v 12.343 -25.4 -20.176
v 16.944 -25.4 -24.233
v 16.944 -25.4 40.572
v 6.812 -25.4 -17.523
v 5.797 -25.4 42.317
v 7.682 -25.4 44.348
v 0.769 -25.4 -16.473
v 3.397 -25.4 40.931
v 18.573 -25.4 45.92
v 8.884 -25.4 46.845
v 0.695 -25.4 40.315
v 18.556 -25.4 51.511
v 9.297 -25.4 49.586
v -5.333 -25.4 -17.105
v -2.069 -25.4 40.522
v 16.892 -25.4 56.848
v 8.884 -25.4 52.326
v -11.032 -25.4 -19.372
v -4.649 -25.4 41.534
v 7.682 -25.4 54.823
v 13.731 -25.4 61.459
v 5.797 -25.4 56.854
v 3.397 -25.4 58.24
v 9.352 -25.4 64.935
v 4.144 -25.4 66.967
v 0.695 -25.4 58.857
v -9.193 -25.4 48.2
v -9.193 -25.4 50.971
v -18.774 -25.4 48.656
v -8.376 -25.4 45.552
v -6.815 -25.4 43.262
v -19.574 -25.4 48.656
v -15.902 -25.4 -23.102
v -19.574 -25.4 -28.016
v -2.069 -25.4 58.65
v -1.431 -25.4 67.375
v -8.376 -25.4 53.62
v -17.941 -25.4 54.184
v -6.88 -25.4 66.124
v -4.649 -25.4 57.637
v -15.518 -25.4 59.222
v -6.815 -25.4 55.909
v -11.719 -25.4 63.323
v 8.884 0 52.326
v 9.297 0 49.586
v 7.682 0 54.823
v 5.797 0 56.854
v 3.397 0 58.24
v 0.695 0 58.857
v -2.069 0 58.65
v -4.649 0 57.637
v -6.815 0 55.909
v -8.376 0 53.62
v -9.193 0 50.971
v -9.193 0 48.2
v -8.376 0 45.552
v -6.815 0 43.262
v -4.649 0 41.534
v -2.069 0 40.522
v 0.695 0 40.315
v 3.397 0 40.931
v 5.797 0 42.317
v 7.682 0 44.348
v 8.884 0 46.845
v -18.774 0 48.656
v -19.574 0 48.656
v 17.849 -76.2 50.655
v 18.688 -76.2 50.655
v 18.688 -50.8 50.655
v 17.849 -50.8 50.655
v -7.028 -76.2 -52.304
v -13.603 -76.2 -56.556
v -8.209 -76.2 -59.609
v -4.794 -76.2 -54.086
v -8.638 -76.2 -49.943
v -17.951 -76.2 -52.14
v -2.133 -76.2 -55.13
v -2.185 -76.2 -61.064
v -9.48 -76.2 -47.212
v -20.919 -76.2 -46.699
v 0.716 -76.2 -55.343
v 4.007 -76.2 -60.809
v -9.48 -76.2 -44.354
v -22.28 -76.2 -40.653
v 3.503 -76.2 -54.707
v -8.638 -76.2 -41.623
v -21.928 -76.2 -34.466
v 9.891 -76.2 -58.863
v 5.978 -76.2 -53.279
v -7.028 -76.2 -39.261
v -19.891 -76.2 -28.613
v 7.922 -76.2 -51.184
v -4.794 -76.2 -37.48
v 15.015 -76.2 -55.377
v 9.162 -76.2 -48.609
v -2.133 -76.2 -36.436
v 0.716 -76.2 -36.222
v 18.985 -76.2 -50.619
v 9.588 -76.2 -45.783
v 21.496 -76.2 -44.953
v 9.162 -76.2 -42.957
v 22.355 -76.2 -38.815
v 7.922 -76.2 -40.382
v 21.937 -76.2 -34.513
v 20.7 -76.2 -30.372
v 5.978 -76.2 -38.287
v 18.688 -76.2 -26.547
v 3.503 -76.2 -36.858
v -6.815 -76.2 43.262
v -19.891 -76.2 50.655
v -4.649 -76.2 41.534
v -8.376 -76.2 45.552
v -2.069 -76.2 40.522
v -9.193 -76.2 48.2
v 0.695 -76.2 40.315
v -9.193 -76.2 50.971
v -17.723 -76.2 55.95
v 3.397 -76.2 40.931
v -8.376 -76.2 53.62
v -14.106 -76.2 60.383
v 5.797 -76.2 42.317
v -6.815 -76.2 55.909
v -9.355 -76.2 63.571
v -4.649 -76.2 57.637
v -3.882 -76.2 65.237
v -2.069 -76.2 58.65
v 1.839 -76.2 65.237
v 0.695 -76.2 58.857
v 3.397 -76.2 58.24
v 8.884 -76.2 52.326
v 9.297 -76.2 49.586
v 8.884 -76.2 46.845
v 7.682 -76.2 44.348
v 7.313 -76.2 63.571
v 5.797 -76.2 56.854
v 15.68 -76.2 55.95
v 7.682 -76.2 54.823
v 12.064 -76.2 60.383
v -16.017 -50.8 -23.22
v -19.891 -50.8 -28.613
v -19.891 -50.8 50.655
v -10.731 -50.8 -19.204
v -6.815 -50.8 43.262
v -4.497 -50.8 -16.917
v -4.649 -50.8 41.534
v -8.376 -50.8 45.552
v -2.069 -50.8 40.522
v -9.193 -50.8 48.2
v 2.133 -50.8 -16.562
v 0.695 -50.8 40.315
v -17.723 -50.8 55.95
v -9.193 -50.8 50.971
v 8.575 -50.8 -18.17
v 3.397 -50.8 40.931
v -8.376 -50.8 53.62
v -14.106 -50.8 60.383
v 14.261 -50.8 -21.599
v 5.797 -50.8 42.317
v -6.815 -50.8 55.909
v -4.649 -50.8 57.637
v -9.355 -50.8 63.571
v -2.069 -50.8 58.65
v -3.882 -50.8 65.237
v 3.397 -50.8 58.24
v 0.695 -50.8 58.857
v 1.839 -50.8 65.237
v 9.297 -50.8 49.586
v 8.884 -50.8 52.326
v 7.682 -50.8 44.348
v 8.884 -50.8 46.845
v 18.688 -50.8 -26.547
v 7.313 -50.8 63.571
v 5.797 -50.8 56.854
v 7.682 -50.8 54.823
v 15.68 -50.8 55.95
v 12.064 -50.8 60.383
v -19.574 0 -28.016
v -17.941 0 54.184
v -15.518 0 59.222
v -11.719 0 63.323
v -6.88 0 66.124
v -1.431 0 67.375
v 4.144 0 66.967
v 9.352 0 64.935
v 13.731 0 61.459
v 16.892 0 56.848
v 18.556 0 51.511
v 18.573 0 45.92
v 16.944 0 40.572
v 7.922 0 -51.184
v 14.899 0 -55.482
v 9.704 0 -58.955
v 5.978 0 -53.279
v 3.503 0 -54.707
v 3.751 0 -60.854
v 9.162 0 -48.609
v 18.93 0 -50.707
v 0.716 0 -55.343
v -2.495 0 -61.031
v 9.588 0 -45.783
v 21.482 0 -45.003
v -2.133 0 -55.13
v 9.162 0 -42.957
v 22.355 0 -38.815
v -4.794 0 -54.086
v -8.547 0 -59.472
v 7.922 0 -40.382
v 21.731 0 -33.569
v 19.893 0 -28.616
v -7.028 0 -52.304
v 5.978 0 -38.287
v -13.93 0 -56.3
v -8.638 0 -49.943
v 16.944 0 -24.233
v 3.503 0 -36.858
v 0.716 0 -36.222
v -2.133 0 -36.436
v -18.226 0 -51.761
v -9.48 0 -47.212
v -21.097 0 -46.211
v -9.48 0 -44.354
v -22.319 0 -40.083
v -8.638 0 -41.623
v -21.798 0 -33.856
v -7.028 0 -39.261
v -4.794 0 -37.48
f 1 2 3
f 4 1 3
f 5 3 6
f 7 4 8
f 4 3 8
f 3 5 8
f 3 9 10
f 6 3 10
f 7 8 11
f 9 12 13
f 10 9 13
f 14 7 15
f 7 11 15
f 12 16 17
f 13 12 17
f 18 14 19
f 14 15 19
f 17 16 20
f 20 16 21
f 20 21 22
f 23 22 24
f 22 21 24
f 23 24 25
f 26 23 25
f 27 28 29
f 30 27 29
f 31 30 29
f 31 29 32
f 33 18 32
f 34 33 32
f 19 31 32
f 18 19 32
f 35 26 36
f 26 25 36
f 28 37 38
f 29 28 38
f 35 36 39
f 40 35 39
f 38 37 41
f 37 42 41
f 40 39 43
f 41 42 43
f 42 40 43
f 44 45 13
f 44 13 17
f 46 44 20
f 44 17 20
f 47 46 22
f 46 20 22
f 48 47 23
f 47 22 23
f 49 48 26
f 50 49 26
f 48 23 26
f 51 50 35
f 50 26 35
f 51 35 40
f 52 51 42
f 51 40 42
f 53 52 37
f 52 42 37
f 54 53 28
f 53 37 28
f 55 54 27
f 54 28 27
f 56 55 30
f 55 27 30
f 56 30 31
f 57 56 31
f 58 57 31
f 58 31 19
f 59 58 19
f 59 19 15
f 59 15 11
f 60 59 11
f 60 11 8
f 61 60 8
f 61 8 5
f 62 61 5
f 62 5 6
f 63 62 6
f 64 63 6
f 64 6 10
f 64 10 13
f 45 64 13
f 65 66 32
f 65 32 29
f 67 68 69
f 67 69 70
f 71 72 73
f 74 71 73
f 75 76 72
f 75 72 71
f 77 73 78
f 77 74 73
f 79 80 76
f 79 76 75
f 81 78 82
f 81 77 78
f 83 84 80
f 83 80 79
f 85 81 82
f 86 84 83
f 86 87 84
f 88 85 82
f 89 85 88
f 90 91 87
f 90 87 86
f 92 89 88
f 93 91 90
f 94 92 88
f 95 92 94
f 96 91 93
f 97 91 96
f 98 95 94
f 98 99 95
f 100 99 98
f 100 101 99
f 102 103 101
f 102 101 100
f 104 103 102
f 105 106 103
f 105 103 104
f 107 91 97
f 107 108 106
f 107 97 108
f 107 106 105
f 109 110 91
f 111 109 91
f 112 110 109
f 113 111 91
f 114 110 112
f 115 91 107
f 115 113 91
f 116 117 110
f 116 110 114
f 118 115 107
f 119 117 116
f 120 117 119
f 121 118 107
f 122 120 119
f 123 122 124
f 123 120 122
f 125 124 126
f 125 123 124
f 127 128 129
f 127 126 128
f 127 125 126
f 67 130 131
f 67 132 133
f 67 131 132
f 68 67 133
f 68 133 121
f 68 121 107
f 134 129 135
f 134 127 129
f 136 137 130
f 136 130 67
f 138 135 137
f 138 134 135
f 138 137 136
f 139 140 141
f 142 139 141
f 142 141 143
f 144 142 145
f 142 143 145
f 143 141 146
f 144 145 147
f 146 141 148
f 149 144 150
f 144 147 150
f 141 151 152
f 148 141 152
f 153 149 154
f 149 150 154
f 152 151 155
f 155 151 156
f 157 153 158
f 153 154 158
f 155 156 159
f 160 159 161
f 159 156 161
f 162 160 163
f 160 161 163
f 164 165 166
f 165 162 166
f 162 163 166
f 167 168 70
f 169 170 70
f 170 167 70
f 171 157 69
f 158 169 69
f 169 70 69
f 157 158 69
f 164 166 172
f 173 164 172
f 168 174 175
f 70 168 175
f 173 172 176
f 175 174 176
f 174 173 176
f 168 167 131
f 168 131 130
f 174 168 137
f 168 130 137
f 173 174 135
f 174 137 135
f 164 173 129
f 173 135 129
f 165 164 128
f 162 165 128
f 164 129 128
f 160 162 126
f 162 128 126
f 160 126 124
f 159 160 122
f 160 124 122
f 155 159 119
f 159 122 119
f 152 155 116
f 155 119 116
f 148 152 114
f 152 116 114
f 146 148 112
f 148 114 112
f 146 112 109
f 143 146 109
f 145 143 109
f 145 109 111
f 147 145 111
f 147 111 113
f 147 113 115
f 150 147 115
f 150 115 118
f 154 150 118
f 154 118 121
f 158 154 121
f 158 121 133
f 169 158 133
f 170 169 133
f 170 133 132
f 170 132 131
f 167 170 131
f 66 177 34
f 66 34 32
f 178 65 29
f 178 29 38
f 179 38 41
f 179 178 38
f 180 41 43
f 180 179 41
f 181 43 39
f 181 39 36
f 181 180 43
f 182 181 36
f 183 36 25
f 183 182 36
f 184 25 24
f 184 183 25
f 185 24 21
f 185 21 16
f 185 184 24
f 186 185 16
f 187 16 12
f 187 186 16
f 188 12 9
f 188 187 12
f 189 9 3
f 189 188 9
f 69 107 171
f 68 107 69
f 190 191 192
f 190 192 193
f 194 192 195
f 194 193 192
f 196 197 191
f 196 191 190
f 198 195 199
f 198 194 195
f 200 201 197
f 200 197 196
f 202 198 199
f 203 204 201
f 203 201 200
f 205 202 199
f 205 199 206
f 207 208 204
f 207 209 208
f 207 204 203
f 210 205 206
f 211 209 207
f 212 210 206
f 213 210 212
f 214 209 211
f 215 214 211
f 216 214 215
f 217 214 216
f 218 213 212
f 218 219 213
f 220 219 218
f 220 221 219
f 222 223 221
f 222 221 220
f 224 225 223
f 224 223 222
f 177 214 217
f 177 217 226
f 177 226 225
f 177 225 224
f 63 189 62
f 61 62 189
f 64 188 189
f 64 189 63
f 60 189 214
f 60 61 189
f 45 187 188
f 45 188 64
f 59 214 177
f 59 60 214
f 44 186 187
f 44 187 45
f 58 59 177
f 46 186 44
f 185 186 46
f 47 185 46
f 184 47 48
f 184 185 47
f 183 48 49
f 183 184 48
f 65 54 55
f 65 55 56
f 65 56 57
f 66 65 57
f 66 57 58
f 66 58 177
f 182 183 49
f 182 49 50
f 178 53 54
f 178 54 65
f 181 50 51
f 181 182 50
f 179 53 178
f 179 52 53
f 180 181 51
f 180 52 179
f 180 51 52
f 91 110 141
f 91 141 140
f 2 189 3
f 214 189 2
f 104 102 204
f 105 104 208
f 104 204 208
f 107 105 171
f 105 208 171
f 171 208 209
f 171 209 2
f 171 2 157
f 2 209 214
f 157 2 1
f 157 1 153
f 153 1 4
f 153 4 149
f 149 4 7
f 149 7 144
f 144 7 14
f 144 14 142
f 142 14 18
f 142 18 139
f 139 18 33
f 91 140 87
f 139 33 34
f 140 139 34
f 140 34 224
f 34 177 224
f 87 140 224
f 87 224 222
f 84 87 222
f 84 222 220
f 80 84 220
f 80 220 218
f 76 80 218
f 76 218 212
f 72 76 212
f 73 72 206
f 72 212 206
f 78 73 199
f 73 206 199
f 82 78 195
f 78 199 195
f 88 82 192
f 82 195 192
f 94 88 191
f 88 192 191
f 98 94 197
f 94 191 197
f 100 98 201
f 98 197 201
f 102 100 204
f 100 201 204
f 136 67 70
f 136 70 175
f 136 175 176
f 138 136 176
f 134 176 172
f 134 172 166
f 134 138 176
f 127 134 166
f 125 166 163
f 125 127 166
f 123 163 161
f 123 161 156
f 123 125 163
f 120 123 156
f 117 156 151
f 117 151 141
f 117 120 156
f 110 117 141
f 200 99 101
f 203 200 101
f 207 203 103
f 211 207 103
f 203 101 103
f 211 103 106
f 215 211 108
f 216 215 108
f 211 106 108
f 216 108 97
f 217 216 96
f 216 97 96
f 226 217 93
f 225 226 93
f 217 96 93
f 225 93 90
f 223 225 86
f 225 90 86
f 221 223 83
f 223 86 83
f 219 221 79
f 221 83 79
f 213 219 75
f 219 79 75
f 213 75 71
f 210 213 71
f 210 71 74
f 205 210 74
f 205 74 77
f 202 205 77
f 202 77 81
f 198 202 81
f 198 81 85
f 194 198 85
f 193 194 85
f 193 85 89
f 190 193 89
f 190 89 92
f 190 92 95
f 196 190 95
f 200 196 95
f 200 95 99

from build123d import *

# Parameters (mm, degrees)
F0_R      = 22.355293723
F10_DEPTH = 25.4
F1_DEPTH  = 50.8
F11_DEPTH = 25.4
F3_DEPTH  = 25.4
F14_DEPTH = 25.4
F5_DEPTH  = 25.4
F6_R      = 9.2971028971
F7_DEPTH  = 76.201
F8_R      = 9.5875632129
F9_DEPTH  = 76.201


with BuildPart() as f10:
    # F0 (on Front) → F10 (new body)
    with BuildSketch(Plane.XZ):
        with Locations((0, -38.8152748346)):
            Circle(F0_R)
    extrude(amount=F10_DEPTH)

    # F1 (add): a face of the model
    f1_faces = [f10.faces().sort_by_distance(p)[0] for p in [
        (0, -25.4, -38.8152748346),
    ]]
    extrude(f1_faces, amount=F1_DEPTH)

    # F2 (on face) → F11 (join)
    with BuildSketch(Plane.XZ.offset(76.2)):
        with BuildLine():
            Line((18.6882317066, -26.5470576406), (18.6882317066, 50.6553947926))
            Line((18.6882317066, 50.6553947926), (-19.891411387, 50.6553947926))
            Line((-19.891411387, 50.6553947926), (-19.891411387, -28.6127795284))
            ThreePointArc((-19.891411387, -28.6127795284), (-1.1952874404, -16.4919586523), (18.6882317066, -26.5470576406))
        make_face()
    extrude(amount=-F11_DEPTH)

    # F12 (on face) → F3 (join)
    with BuildSketch(Plane(origin=(0, 0, 0), x_dir=(-1, 0, 0), z_dir=(0, 1, 0))):
        with BuildLine():
            Line((19.5738153324, 48.656180501), (-16.9442743063, 48.656180501))
            Line((-16.9442743063, 48.656180501), (-16.9442743063, -24.232726166))
            ThreePointArc((-16.9442743063, -24.232726166), (2.3036626211, -16.5789915128), (19.5738153324, -28.0159734325))
            Line((19.5738153324, -28.0159734325), (19.5738153324, 48.656180501))
        make_face()
    extrude(amount=-F3_DEPTH)

    # F13 (on face) → F14 (join)
    with BuildSketch(Plane.XZ.offset(76.2)):
        with BuildLine():
            Line((-19.891411387, 50.6553947926), (17.8490708054, 50.6553947926))
            ThreePointArc((17.8490708054, 50.6553947926), (-1.0211702908, 65.4485059403), (-19.891411387, 50.6553947926))
        make_face()
    extrude(amount=-F14_DEPTH)

    # F4 (on face) → F5 (join)
    with BuildSketch(Plane(origin=(0, 0, 0), x_dir=(-1, 0, 0), z_dir=(0, 1, 0))):
        with BuildLine():
            Line((-16.9442743063, 48.656180501), (18.7738145008, 48.656180501))
            ThreePointArc((18.7738145008, 48.656180501), (-4.1441192209, 66.9668983131), (-16.9442743063, 40.5723893641))
            Line((-16.9442743063, 40.5723893641), (-16.9442743063, 48.656180501))
        make_face()
    extrude(amount=-F5_DEPTH)

    # F6 (on face) → F7 (cut, through all)
    with BuildSketch(Plane.XZ.offset(76.2)):
        with Locations((0, 49.5857223868)):
            Circle(F6_R)
    extrude(amount=-F7_DEPTH, mode=Mode.SUBTRACT)

    # F8 (on face) → F9 (cut, through all)
    with BuildSketch(Plane.XZ.offset(76.2)):
        with Locations((0, -45.7826852798)):
            Circle(F8_R)
    extrude(amount=-F9_DEPTH, mode=Mode.SUBTRACT)


solid = f10.part
